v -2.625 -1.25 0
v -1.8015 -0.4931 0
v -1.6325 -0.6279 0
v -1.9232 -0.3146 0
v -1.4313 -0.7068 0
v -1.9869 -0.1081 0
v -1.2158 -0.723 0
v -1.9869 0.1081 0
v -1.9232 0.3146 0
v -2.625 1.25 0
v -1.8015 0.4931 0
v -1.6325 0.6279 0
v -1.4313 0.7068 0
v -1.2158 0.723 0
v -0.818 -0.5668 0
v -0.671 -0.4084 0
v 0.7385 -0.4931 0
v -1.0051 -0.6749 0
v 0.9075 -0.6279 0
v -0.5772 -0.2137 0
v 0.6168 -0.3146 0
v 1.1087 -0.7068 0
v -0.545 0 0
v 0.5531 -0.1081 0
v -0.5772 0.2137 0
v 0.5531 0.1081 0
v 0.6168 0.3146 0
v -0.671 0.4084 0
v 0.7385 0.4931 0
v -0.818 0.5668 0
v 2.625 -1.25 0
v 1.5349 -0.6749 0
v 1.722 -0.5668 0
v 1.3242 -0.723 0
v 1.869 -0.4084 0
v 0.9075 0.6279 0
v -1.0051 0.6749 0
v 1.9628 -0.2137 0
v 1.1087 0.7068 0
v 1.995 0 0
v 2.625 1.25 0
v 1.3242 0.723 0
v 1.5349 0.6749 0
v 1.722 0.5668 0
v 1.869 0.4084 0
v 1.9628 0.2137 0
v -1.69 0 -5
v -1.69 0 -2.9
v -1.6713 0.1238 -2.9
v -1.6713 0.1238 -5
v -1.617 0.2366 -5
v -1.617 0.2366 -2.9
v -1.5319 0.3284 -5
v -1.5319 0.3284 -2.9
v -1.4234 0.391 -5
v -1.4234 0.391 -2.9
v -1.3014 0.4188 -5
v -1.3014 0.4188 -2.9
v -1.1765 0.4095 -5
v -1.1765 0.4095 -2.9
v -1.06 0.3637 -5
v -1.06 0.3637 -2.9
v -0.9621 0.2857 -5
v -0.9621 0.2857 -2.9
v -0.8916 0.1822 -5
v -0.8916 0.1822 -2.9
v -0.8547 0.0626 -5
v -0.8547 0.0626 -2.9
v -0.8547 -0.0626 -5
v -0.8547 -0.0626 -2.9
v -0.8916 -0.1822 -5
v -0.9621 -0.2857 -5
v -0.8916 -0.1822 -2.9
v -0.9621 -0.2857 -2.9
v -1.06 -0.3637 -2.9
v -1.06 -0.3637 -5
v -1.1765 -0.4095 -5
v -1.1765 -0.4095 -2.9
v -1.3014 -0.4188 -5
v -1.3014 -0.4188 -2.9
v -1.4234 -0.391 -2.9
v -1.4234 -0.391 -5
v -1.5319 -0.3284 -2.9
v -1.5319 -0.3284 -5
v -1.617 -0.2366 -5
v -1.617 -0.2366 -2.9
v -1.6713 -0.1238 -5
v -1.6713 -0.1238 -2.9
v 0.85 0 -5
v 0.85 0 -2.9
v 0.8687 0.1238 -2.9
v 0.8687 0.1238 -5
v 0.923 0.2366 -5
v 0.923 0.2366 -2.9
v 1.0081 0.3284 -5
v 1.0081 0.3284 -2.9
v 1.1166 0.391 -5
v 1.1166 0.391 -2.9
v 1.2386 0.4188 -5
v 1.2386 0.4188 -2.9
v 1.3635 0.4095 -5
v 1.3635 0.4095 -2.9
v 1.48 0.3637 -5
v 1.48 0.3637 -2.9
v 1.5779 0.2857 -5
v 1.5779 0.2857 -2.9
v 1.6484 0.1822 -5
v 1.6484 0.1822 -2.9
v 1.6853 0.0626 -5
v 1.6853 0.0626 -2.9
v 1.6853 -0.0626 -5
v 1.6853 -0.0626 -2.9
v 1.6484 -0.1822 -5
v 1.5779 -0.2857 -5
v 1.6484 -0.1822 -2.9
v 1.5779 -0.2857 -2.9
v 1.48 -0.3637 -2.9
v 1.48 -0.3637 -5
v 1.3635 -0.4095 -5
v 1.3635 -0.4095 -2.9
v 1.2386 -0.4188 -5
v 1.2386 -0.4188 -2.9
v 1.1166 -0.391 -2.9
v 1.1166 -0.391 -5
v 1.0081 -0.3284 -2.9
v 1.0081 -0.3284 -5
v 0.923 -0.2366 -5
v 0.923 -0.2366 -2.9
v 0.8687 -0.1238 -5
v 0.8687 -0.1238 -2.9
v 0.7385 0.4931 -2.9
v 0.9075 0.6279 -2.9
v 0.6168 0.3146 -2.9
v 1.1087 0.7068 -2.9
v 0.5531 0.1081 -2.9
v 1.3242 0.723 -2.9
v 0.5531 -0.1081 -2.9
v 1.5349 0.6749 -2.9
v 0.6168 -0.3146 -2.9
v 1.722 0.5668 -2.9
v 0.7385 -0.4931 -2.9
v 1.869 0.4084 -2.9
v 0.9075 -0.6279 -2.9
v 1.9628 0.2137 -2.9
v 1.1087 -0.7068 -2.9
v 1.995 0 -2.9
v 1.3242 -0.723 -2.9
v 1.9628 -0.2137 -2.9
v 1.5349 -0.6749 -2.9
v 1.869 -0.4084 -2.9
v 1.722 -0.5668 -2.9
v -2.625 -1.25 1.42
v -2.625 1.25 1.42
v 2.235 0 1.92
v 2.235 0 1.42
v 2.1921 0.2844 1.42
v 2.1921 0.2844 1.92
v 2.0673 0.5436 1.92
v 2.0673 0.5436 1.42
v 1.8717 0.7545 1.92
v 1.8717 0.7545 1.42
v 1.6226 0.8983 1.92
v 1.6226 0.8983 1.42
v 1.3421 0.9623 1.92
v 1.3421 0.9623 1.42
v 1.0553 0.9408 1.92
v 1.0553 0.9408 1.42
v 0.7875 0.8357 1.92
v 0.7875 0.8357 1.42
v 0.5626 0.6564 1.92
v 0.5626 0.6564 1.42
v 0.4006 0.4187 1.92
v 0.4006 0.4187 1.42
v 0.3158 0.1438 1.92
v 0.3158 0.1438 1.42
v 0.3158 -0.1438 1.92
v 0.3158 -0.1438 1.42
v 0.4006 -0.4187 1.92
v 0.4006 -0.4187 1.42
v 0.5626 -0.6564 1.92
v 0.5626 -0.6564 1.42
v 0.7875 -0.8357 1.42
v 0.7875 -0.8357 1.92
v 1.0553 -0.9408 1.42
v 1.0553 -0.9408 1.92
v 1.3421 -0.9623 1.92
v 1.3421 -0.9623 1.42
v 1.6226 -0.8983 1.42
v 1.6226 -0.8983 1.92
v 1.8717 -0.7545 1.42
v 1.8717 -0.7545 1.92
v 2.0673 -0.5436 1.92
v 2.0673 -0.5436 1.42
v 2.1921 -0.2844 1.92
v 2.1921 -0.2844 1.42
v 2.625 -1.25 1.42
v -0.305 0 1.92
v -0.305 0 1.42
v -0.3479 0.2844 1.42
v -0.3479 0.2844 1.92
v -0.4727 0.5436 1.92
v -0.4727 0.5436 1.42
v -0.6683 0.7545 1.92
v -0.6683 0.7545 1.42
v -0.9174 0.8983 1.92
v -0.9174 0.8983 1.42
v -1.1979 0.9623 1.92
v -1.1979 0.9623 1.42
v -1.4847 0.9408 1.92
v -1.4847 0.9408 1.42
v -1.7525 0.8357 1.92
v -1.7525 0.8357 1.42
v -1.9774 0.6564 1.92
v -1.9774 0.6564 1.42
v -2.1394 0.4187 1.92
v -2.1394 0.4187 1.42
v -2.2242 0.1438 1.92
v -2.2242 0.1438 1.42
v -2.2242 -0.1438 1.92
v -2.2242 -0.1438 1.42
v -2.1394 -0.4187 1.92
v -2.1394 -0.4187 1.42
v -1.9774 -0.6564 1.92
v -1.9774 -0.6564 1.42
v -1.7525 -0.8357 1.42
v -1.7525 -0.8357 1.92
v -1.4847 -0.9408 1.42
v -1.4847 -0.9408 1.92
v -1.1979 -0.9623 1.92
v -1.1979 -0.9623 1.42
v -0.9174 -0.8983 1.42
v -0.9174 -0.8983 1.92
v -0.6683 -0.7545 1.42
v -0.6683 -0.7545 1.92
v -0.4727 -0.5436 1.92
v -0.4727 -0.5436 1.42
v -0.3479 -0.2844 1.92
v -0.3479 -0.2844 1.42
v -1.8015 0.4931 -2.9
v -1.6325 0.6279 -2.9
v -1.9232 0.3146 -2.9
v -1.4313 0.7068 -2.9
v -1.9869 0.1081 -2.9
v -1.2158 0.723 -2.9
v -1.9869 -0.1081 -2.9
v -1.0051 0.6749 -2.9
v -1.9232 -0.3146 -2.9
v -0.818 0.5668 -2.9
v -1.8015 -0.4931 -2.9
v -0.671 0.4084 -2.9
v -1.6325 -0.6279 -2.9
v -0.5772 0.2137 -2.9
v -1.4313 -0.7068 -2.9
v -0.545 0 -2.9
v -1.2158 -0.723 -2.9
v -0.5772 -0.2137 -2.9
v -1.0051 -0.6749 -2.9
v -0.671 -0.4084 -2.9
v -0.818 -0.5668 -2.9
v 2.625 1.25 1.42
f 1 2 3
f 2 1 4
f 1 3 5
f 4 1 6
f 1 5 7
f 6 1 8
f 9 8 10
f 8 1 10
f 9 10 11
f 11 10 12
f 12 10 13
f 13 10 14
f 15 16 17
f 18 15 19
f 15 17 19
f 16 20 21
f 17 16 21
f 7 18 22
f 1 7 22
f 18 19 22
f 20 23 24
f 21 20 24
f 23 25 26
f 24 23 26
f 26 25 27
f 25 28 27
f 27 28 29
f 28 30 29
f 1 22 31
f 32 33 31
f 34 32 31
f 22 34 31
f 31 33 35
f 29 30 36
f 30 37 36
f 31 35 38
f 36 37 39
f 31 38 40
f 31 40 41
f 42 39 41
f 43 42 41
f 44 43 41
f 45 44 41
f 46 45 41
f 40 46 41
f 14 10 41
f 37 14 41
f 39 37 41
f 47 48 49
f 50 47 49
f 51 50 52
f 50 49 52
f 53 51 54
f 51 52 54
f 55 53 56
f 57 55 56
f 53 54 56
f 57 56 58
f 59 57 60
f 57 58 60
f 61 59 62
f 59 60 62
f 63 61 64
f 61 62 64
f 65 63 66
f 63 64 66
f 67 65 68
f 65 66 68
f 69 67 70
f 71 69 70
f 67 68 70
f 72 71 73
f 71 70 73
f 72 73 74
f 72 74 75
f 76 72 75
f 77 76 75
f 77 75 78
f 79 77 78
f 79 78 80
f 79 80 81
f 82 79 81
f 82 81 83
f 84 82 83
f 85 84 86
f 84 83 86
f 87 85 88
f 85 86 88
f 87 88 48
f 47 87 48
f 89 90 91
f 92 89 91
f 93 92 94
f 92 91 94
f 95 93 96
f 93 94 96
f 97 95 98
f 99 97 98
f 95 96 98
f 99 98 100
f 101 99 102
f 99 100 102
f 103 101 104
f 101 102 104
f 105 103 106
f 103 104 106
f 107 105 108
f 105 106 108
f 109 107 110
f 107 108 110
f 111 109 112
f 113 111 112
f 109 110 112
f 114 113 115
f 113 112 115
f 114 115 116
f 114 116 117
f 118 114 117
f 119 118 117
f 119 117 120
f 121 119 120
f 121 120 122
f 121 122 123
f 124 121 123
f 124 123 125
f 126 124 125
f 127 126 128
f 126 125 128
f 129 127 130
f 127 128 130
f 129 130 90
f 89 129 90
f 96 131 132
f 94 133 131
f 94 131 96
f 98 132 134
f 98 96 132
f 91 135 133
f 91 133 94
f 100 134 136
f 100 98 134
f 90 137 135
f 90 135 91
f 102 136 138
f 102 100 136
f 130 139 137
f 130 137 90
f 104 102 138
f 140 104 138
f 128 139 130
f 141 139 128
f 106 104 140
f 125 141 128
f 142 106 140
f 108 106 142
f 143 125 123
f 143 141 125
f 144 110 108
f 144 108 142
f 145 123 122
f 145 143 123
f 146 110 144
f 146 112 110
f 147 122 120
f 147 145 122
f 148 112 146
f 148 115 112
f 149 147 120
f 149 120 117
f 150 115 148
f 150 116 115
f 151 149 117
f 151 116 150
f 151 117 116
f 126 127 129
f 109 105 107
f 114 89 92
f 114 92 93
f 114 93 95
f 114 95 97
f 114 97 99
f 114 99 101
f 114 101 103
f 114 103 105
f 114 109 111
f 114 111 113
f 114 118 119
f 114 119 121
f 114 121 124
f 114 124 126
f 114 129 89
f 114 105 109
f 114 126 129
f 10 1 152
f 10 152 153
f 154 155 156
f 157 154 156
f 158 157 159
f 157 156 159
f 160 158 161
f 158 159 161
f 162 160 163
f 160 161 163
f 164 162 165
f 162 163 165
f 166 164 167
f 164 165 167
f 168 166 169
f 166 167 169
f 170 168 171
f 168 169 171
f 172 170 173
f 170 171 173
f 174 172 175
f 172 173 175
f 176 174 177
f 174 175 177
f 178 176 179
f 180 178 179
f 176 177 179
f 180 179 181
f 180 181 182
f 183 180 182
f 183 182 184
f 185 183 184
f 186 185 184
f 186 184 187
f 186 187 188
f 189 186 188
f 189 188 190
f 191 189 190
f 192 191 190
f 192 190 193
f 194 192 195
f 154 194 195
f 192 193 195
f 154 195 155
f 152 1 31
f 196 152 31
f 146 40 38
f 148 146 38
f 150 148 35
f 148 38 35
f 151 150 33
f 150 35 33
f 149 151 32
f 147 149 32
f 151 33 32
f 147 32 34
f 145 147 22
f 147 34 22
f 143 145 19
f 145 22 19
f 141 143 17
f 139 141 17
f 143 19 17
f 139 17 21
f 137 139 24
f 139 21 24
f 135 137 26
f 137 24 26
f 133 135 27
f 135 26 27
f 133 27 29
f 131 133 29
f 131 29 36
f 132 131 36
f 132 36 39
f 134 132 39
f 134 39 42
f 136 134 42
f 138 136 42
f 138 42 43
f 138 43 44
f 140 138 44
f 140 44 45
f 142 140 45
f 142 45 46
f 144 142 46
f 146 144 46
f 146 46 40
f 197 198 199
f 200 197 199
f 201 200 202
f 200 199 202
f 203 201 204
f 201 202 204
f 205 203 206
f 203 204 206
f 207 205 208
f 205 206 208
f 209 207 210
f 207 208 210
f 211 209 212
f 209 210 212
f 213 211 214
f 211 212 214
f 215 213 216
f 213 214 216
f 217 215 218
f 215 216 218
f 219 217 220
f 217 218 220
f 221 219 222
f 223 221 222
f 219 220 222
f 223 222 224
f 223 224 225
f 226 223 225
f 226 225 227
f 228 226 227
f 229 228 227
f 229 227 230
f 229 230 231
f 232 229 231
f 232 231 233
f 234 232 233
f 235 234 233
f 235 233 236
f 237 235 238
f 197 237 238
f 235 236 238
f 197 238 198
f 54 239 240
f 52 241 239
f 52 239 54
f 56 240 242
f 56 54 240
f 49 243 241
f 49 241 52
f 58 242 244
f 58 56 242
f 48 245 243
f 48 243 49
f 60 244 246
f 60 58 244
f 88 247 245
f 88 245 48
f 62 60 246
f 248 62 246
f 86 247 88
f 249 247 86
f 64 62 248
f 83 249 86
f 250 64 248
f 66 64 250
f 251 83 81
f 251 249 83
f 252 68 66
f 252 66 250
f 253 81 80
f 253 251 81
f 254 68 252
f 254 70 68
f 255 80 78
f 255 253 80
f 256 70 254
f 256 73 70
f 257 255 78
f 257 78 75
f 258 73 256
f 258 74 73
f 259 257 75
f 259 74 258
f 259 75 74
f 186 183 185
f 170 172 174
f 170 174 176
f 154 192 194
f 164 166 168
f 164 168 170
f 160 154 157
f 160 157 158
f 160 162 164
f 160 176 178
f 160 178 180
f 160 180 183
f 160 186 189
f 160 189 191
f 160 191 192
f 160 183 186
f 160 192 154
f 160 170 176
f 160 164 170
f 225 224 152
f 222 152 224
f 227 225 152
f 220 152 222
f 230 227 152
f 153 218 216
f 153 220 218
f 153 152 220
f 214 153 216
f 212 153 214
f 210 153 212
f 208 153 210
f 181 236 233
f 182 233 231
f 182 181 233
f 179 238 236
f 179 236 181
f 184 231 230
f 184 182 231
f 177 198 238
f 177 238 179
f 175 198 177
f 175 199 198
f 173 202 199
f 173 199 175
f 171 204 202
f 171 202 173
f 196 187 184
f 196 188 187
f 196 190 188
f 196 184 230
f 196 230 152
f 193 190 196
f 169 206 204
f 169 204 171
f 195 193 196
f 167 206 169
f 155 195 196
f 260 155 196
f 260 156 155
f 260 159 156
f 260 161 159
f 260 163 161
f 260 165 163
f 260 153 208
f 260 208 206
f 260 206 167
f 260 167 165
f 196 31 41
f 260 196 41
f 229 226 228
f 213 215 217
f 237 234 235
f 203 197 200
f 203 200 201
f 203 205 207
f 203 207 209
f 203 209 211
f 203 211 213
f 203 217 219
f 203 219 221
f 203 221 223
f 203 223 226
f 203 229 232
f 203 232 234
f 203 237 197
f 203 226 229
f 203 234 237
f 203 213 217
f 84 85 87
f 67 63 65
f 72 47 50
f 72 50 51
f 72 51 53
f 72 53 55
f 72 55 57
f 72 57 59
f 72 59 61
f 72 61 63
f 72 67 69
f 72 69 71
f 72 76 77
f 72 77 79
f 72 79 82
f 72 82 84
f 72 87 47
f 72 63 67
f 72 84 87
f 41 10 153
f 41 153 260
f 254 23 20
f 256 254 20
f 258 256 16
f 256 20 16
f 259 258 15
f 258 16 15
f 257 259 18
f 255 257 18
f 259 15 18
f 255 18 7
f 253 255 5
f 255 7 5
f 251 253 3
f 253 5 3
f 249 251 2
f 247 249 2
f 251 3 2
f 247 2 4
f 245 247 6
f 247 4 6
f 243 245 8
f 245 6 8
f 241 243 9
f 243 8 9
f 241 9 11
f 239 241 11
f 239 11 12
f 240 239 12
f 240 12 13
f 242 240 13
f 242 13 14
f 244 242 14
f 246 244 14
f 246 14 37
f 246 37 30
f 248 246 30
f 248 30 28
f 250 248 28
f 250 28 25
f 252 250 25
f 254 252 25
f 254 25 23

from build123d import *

# Parameters (mm, degrees)
SKETCH_1_W          = 5.25
SKETCH_1_H          = 2.5
EXTRUDE_1_DEPTH     = 1.42
SKETCH_2_R          = 0.725
EXTRUDE_2_DEPTH     = 5
SKETCH_3_R          = 0.965
EXTRUDE_3_DEPTH     = 0.5
CUT_EXTRUDE_START   = -2.1
SKETCH_4_R          = 0.725
SKETCH_4_R_2        = 0.42
CUT_EXTRUDE_1_DEPTH = 2.1


with BuildPart() as part:
    # ｽｹｯﾁ1 → ﾎﾞｽ - 押し出し1 (new body)
    with BuildSketch(Plane.XY):
        Rectangle(SKETCH_1_W, SKETCH_1_H)
    extrude(amount=EXTRUDE_1_DEPTH)

    # ｽｹｯﾁ2 → ﾎﾞｽ - 押し出し2 (add)
    with BuildSketch(Plane(origin=(0, 0, 0), x_dir=(-1, 0, 0), z_dir=(0, 0, -1))):
        with Locations(Location((-1.27, 0, 0), (0, 0, 180))):
            Circle(SKETCH_2_R)
        with Locations(Location((1.27, 0, 0), (0, 0, 180))):
            Circle(SKETCH_2_R)
    extrude(amount=EXTRUDE_2_DEPTH)

    # ｽｹｯﾁ3 → ﾎﾞｽ - 押し出し3 (add)
    with BuildSketch(Plane.XY.offset(1.42)):
        with Locations((-1.27, 0)):
            Circle(SKETCH_3_R)
        with Locations((1.27, 0)):
            Circle(SKETCH_3_R)
    extrude(amount=EXTRUDE_3_DEPTH)

    # ｽｹｯﾁ4 → ｶｯﾄ - 押し出し1 (cut)
    # profile 1 of 2: a face of its own
    with BuildSketch(Plane(origin=(0, 0, -5), x_dir=(-1, 0, 0), z_dir=(0, 0, -1)).offset(CUT_EXTRUDE_START)):
        with Locations(Location((-1.27, 0, 0), (0, 0, 180))):
            Circle(SKETCH_4_R)
        with Locations((-1.27, 0)):
            Circle(SKETCH_4_R_2, mode=Mode.SUBTRACT)
    # profile 2 of 2: a face of its own
    with BuildSketch(Plane(origin=(0, 0, -5), x_dir=(-1, 0, 0), z_dir=(0, 0, -1)).offset(CUT_EXTRUDE_START)):
        with Locations(Location((1.27, 0, 0), (0, 0, 180))):
            Circle(SKETCH_4_R)
        with Locations((1.27, 0)):
            Circle(SKETCH_4_R_2, mode=Mode.SUBTRACT)
    extrude(amount=CUT_EXTRUDE_1_DEPTH, mode=Mode.SUBTRACT)


solid = part.part
